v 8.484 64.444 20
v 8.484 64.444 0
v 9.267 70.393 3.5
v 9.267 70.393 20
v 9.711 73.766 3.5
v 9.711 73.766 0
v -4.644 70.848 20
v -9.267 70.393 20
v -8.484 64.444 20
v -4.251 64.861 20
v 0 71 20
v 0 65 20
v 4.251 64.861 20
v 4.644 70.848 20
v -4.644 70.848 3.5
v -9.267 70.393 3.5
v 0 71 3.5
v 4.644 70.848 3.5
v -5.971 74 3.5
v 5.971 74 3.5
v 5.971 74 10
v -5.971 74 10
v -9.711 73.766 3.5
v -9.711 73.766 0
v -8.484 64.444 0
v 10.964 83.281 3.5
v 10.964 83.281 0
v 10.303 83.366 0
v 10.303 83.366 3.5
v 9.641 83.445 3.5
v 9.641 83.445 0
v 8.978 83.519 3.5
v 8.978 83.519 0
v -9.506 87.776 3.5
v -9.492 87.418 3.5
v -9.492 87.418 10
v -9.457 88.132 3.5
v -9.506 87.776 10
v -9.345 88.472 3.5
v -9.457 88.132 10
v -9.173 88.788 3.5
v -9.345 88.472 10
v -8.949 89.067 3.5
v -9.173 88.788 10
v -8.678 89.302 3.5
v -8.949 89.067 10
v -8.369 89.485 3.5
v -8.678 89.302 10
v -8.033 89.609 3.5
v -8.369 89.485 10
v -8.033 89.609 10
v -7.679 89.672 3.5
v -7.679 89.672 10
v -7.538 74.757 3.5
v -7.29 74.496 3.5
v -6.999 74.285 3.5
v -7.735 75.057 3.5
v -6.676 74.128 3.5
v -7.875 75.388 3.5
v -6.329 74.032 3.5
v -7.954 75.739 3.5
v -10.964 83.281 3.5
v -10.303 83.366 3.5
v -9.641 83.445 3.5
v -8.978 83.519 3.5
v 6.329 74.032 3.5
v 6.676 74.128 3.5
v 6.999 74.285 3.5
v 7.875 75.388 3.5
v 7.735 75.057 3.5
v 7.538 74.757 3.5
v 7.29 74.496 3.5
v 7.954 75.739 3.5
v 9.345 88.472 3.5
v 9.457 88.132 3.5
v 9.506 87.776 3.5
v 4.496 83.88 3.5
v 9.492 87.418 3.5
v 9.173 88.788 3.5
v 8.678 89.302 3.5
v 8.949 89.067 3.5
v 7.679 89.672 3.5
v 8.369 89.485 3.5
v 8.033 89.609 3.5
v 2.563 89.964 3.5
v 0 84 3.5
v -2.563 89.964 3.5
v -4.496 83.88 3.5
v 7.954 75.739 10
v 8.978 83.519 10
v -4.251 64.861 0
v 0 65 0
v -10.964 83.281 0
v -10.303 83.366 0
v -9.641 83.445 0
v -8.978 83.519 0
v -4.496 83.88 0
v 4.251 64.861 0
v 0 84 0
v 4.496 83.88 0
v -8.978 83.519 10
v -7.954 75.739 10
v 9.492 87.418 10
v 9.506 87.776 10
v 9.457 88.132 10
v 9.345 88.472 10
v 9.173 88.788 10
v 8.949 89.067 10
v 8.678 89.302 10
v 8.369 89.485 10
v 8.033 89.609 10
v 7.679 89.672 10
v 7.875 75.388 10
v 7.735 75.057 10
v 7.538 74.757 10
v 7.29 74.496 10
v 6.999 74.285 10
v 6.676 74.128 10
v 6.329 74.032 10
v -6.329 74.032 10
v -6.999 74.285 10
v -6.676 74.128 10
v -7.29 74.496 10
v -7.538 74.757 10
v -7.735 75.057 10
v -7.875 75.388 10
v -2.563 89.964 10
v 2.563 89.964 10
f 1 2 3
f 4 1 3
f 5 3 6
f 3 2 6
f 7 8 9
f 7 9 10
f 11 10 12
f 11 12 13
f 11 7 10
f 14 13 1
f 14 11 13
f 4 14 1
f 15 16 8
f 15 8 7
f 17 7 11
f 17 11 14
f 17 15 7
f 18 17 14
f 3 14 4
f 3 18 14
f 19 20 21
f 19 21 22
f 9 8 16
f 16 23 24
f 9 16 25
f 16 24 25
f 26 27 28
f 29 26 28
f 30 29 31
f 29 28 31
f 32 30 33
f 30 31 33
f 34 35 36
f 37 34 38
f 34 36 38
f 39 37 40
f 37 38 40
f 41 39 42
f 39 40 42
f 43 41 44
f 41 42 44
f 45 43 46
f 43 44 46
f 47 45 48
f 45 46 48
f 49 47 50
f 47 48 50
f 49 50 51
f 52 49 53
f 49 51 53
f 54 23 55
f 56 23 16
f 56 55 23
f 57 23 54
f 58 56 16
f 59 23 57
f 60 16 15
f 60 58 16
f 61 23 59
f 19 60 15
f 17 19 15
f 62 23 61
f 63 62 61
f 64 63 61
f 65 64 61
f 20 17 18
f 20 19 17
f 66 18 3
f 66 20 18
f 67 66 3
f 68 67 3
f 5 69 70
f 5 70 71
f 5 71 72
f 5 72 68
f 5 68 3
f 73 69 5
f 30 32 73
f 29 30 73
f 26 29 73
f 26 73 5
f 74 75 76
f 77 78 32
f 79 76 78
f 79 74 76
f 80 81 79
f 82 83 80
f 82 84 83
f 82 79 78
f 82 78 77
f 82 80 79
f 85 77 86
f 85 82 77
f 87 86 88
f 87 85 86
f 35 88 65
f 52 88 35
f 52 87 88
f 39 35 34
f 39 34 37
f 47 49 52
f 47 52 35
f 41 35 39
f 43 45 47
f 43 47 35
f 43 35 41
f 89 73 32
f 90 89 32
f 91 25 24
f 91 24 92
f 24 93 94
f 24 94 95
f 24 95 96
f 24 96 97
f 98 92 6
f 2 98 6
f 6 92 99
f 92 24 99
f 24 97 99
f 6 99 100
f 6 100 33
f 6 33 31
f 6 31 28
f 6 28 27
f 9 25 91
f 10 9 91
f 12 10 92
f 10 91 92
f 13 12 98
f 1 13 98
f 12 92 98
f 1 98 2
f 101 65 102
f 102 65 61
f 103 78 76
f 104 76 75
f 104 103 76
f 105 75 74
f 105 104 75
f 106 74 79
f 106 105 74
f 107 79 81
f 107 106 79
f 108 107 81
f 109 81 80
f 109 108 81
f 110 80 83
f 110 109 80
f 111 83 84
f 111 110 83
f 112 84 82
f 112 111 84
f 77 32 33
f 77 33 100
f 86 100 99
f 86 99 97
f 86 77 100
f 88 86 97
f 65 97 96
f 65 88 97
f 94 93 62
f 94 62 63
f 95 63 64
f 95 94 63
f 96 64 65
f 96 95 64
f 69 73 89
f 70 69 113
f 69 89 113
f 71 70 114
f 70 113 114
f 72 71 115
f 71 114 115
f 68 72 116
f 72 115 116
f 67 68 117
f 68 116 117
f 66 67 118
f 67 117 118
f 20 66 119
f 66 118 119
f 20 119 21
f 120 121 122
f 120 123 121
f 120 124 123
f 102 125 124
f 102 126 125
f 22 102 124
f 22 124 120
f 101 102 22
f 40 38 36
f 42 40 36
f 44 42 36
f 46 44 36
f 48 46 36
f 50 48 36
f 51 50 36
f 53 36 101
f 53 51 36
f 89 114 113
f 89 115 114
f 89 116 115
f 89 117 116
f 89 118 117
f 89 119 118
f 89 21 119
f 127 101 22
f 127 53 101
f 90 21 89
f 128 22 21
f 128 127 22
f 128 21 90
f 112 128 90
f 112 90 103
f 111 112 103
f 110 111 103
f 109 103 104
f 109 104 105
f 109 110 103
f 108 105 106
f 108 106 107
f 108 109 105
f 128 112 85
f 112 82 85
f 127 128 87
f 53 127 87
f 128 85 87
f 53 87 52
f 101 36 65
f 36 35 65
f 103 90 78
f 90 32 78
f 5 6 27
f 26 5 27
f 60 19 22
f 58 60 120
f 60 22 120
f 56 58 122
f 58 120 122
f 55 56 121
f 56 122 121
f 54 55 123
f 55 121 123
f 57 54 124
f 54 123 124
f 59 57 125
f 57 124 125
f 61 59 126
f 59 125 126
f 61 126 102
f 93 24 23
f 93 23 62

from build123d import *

# Parameters (mm, degrees)
BOSS_EXTRUDE1_DEPTH = 20
CUT_EXTRUDE1_START  = -3.5
CUT_EXTRUDE1_DEPTH  = 3.5
CUT_EXTRUDE2_START  = -16.5
CUT_EXTRUDE2_DEPTH  = 16.5
CUT_EXTRUDE3_START  = -10
CUT_EXTRUDE3_DEPTH  = 10
BOSS_EXTRUDE2_START = -3.5
BOSS_EXTRUDE2_DEPTH = 3.5
FILLET1_R           = 2


with BuildPart() as part:
    # Sketch1 → Boss-Extrude1 (new body)
    with BuildSketch(Plane.XY):
        with BuildLine():
            Line((-8.978202217, 83.518811563), (-7.7250269, 74))
            ThreePointArc((-7.7250269, 74), (-8.71901412, 73.889477149), (-9.711425926, 73.765603414))
            Line((-9.711425926, 73.765603414), (-8.484202494, 64.443915989))
            ThreePointArc((-8.484202494, 64.443915989), (0, 65), (8.484202494, 64.443915989))
            Line((8.484202494, 64.443915989), (9.711425926, 73.765603414))
            ThreePointArc((9.711425926, 73.765603414), (8.71901412, 73.889477149), (7.7250269, 74))
            Line((7.7250269, 74), (8.978202217, 83.518811563))
            Line((8.978202217, 83.518811563), (9.761566637, 89.469055079))
            ThreePointArc((9.761566637, 89.469055079), (0, 90), (-9.761566637, 89.469055079))
            Line((-9.761566637, 89.469055079), (-8.978202217, 83.518811563))
        make_face()
    extrude(amount=BOSS_EXTRUDE1_DEPTH)

    # Sketch2 → Cut-Extrude1 (cut)
    with BuildSketch(Plane(origin=(0, 0, 0), x_dir=(-1, 0, 0), z_dir=(0, 0, -1)).offset(CUT_EXTRUDE1_START)):
        with BuildLine():
            Line((-9.761566637, 89.469055079), (-8.978202217, 83.518811563))
            ThreePointArc((-8.978202217, 83.518811563), (0, 84), (8.978202217, 83.518811563))
            Line((8.978202217, 83.518811563), (9.761566637, 89.469055079))
            ThreePointArc((9.761566637, 89.469055079), (0, 90), (-9.761566637, 89.469055079))
        make_face()
    extrude(amount=CUT_EXTRUDE1_DEPTH, mode=Mode.SUBTRACT)

    # Sketch3 → Cut-Extrude2 (cut)
    with BuildSketch(Plane.XY.offset(20).offset(CUT_EXTRUDE2_START)):
        with BuildLine():
            Line((7.7250269, 74), (-7.7250269, 74))
            ThreePointArc((-7.7250269, 74), (-8.71901412, 73.889477149), (-9.711425926, 73.765603414))
            Line((-9.711425926, 73.765603414), (-9.267359648, 70.392585158))
            ThreePointArc((-9.267359648, 70.392585158), (0, 71), (9.267359648, 70.392585158))
            Line((9.267359648, 70.392585158), (9.711425926, 73.765603414))
            ThreePointArc((9.711425926, 73.765603414), (8.71901412, 73.889477149), (7.7250269, 74))
        make_face()
    extrude(amount=CUT_EXTRUDE2_DEPTH, mode=Mode.SUBTRACT)

    # Sketch4 → Cut-Extrude3 (cut)
    with BuildSketch(Plane.XY.offset(20).offset(CUT_EXTRUDE3_START)):
        with BuildLine():
            Line((-7.7250269, 74), (7.7250269, 74))
            Line((7.7250269, 74), (9.761566637, 89.469055079))
            ThreePointArc((9.761566637, 89.469055079), (0, 90), (-9.761566637, 89.469055079))
            Line((-9.761566637, 89.469055079), (-7.7250269, 74))
        make_face()
    extrude(amount=CUT_EXTRUDE3_DEPTH, mode=Mode.SUBTRACT)

    # Sketch5 → Boss-Extrude2 (add)
    with BuildSketch(Plane.XY.offset(3.5).offset(BOSS_EXTRUDE2_START)):
        with BuildLine():
            Line((9.711425926, 73.765603414), (10.964200146, 83.281368355))
            ThreePointArc((10.964200146, 83.281368355), (9.971907933, 83.406001296), (8.978202217, 83.518811563))
            Line((8.978202217, 83.518811563), (7.7250269, 74))
            ThreePointArc((7.7250269, 74), (8.71901412, 73.889477149), (9.711425926, 73.765603414))
        make_face()
        with BuildLine():
            Line((-9.711425926, 73.765603414), (-10.964200146, 83.281368355))
            ThreePointArc((-10.964200146, 83.281368355), (-9.971907933, 83.406001296), (-8.978202217, 83.518811563))
            Line((-8.978202217, 83.518811563), (-7.7250269, 74))
            ThreePointArc((-7.7250269, 74), (-8.71901412, 73.889477149), (-9.711425926, 73.765603414))
        make_face()
    extrude(amount=BOSS_EXTRUDE2_DEPTH)

    # Fillet1
    fillet1_edges = [part.edges().sort_by_distance(p)[0] for p in [
        (7.7250269, 74, 6.75),
        (-7.7250269, 74, 6.75),
        (9.761566637, 89.469055079, 6.75),
        (-9.761566637, 89.469055079, 6.75),
    ]]
    fillet(fillet1_edges, radius=FILLET1_R)


solid = part.part
